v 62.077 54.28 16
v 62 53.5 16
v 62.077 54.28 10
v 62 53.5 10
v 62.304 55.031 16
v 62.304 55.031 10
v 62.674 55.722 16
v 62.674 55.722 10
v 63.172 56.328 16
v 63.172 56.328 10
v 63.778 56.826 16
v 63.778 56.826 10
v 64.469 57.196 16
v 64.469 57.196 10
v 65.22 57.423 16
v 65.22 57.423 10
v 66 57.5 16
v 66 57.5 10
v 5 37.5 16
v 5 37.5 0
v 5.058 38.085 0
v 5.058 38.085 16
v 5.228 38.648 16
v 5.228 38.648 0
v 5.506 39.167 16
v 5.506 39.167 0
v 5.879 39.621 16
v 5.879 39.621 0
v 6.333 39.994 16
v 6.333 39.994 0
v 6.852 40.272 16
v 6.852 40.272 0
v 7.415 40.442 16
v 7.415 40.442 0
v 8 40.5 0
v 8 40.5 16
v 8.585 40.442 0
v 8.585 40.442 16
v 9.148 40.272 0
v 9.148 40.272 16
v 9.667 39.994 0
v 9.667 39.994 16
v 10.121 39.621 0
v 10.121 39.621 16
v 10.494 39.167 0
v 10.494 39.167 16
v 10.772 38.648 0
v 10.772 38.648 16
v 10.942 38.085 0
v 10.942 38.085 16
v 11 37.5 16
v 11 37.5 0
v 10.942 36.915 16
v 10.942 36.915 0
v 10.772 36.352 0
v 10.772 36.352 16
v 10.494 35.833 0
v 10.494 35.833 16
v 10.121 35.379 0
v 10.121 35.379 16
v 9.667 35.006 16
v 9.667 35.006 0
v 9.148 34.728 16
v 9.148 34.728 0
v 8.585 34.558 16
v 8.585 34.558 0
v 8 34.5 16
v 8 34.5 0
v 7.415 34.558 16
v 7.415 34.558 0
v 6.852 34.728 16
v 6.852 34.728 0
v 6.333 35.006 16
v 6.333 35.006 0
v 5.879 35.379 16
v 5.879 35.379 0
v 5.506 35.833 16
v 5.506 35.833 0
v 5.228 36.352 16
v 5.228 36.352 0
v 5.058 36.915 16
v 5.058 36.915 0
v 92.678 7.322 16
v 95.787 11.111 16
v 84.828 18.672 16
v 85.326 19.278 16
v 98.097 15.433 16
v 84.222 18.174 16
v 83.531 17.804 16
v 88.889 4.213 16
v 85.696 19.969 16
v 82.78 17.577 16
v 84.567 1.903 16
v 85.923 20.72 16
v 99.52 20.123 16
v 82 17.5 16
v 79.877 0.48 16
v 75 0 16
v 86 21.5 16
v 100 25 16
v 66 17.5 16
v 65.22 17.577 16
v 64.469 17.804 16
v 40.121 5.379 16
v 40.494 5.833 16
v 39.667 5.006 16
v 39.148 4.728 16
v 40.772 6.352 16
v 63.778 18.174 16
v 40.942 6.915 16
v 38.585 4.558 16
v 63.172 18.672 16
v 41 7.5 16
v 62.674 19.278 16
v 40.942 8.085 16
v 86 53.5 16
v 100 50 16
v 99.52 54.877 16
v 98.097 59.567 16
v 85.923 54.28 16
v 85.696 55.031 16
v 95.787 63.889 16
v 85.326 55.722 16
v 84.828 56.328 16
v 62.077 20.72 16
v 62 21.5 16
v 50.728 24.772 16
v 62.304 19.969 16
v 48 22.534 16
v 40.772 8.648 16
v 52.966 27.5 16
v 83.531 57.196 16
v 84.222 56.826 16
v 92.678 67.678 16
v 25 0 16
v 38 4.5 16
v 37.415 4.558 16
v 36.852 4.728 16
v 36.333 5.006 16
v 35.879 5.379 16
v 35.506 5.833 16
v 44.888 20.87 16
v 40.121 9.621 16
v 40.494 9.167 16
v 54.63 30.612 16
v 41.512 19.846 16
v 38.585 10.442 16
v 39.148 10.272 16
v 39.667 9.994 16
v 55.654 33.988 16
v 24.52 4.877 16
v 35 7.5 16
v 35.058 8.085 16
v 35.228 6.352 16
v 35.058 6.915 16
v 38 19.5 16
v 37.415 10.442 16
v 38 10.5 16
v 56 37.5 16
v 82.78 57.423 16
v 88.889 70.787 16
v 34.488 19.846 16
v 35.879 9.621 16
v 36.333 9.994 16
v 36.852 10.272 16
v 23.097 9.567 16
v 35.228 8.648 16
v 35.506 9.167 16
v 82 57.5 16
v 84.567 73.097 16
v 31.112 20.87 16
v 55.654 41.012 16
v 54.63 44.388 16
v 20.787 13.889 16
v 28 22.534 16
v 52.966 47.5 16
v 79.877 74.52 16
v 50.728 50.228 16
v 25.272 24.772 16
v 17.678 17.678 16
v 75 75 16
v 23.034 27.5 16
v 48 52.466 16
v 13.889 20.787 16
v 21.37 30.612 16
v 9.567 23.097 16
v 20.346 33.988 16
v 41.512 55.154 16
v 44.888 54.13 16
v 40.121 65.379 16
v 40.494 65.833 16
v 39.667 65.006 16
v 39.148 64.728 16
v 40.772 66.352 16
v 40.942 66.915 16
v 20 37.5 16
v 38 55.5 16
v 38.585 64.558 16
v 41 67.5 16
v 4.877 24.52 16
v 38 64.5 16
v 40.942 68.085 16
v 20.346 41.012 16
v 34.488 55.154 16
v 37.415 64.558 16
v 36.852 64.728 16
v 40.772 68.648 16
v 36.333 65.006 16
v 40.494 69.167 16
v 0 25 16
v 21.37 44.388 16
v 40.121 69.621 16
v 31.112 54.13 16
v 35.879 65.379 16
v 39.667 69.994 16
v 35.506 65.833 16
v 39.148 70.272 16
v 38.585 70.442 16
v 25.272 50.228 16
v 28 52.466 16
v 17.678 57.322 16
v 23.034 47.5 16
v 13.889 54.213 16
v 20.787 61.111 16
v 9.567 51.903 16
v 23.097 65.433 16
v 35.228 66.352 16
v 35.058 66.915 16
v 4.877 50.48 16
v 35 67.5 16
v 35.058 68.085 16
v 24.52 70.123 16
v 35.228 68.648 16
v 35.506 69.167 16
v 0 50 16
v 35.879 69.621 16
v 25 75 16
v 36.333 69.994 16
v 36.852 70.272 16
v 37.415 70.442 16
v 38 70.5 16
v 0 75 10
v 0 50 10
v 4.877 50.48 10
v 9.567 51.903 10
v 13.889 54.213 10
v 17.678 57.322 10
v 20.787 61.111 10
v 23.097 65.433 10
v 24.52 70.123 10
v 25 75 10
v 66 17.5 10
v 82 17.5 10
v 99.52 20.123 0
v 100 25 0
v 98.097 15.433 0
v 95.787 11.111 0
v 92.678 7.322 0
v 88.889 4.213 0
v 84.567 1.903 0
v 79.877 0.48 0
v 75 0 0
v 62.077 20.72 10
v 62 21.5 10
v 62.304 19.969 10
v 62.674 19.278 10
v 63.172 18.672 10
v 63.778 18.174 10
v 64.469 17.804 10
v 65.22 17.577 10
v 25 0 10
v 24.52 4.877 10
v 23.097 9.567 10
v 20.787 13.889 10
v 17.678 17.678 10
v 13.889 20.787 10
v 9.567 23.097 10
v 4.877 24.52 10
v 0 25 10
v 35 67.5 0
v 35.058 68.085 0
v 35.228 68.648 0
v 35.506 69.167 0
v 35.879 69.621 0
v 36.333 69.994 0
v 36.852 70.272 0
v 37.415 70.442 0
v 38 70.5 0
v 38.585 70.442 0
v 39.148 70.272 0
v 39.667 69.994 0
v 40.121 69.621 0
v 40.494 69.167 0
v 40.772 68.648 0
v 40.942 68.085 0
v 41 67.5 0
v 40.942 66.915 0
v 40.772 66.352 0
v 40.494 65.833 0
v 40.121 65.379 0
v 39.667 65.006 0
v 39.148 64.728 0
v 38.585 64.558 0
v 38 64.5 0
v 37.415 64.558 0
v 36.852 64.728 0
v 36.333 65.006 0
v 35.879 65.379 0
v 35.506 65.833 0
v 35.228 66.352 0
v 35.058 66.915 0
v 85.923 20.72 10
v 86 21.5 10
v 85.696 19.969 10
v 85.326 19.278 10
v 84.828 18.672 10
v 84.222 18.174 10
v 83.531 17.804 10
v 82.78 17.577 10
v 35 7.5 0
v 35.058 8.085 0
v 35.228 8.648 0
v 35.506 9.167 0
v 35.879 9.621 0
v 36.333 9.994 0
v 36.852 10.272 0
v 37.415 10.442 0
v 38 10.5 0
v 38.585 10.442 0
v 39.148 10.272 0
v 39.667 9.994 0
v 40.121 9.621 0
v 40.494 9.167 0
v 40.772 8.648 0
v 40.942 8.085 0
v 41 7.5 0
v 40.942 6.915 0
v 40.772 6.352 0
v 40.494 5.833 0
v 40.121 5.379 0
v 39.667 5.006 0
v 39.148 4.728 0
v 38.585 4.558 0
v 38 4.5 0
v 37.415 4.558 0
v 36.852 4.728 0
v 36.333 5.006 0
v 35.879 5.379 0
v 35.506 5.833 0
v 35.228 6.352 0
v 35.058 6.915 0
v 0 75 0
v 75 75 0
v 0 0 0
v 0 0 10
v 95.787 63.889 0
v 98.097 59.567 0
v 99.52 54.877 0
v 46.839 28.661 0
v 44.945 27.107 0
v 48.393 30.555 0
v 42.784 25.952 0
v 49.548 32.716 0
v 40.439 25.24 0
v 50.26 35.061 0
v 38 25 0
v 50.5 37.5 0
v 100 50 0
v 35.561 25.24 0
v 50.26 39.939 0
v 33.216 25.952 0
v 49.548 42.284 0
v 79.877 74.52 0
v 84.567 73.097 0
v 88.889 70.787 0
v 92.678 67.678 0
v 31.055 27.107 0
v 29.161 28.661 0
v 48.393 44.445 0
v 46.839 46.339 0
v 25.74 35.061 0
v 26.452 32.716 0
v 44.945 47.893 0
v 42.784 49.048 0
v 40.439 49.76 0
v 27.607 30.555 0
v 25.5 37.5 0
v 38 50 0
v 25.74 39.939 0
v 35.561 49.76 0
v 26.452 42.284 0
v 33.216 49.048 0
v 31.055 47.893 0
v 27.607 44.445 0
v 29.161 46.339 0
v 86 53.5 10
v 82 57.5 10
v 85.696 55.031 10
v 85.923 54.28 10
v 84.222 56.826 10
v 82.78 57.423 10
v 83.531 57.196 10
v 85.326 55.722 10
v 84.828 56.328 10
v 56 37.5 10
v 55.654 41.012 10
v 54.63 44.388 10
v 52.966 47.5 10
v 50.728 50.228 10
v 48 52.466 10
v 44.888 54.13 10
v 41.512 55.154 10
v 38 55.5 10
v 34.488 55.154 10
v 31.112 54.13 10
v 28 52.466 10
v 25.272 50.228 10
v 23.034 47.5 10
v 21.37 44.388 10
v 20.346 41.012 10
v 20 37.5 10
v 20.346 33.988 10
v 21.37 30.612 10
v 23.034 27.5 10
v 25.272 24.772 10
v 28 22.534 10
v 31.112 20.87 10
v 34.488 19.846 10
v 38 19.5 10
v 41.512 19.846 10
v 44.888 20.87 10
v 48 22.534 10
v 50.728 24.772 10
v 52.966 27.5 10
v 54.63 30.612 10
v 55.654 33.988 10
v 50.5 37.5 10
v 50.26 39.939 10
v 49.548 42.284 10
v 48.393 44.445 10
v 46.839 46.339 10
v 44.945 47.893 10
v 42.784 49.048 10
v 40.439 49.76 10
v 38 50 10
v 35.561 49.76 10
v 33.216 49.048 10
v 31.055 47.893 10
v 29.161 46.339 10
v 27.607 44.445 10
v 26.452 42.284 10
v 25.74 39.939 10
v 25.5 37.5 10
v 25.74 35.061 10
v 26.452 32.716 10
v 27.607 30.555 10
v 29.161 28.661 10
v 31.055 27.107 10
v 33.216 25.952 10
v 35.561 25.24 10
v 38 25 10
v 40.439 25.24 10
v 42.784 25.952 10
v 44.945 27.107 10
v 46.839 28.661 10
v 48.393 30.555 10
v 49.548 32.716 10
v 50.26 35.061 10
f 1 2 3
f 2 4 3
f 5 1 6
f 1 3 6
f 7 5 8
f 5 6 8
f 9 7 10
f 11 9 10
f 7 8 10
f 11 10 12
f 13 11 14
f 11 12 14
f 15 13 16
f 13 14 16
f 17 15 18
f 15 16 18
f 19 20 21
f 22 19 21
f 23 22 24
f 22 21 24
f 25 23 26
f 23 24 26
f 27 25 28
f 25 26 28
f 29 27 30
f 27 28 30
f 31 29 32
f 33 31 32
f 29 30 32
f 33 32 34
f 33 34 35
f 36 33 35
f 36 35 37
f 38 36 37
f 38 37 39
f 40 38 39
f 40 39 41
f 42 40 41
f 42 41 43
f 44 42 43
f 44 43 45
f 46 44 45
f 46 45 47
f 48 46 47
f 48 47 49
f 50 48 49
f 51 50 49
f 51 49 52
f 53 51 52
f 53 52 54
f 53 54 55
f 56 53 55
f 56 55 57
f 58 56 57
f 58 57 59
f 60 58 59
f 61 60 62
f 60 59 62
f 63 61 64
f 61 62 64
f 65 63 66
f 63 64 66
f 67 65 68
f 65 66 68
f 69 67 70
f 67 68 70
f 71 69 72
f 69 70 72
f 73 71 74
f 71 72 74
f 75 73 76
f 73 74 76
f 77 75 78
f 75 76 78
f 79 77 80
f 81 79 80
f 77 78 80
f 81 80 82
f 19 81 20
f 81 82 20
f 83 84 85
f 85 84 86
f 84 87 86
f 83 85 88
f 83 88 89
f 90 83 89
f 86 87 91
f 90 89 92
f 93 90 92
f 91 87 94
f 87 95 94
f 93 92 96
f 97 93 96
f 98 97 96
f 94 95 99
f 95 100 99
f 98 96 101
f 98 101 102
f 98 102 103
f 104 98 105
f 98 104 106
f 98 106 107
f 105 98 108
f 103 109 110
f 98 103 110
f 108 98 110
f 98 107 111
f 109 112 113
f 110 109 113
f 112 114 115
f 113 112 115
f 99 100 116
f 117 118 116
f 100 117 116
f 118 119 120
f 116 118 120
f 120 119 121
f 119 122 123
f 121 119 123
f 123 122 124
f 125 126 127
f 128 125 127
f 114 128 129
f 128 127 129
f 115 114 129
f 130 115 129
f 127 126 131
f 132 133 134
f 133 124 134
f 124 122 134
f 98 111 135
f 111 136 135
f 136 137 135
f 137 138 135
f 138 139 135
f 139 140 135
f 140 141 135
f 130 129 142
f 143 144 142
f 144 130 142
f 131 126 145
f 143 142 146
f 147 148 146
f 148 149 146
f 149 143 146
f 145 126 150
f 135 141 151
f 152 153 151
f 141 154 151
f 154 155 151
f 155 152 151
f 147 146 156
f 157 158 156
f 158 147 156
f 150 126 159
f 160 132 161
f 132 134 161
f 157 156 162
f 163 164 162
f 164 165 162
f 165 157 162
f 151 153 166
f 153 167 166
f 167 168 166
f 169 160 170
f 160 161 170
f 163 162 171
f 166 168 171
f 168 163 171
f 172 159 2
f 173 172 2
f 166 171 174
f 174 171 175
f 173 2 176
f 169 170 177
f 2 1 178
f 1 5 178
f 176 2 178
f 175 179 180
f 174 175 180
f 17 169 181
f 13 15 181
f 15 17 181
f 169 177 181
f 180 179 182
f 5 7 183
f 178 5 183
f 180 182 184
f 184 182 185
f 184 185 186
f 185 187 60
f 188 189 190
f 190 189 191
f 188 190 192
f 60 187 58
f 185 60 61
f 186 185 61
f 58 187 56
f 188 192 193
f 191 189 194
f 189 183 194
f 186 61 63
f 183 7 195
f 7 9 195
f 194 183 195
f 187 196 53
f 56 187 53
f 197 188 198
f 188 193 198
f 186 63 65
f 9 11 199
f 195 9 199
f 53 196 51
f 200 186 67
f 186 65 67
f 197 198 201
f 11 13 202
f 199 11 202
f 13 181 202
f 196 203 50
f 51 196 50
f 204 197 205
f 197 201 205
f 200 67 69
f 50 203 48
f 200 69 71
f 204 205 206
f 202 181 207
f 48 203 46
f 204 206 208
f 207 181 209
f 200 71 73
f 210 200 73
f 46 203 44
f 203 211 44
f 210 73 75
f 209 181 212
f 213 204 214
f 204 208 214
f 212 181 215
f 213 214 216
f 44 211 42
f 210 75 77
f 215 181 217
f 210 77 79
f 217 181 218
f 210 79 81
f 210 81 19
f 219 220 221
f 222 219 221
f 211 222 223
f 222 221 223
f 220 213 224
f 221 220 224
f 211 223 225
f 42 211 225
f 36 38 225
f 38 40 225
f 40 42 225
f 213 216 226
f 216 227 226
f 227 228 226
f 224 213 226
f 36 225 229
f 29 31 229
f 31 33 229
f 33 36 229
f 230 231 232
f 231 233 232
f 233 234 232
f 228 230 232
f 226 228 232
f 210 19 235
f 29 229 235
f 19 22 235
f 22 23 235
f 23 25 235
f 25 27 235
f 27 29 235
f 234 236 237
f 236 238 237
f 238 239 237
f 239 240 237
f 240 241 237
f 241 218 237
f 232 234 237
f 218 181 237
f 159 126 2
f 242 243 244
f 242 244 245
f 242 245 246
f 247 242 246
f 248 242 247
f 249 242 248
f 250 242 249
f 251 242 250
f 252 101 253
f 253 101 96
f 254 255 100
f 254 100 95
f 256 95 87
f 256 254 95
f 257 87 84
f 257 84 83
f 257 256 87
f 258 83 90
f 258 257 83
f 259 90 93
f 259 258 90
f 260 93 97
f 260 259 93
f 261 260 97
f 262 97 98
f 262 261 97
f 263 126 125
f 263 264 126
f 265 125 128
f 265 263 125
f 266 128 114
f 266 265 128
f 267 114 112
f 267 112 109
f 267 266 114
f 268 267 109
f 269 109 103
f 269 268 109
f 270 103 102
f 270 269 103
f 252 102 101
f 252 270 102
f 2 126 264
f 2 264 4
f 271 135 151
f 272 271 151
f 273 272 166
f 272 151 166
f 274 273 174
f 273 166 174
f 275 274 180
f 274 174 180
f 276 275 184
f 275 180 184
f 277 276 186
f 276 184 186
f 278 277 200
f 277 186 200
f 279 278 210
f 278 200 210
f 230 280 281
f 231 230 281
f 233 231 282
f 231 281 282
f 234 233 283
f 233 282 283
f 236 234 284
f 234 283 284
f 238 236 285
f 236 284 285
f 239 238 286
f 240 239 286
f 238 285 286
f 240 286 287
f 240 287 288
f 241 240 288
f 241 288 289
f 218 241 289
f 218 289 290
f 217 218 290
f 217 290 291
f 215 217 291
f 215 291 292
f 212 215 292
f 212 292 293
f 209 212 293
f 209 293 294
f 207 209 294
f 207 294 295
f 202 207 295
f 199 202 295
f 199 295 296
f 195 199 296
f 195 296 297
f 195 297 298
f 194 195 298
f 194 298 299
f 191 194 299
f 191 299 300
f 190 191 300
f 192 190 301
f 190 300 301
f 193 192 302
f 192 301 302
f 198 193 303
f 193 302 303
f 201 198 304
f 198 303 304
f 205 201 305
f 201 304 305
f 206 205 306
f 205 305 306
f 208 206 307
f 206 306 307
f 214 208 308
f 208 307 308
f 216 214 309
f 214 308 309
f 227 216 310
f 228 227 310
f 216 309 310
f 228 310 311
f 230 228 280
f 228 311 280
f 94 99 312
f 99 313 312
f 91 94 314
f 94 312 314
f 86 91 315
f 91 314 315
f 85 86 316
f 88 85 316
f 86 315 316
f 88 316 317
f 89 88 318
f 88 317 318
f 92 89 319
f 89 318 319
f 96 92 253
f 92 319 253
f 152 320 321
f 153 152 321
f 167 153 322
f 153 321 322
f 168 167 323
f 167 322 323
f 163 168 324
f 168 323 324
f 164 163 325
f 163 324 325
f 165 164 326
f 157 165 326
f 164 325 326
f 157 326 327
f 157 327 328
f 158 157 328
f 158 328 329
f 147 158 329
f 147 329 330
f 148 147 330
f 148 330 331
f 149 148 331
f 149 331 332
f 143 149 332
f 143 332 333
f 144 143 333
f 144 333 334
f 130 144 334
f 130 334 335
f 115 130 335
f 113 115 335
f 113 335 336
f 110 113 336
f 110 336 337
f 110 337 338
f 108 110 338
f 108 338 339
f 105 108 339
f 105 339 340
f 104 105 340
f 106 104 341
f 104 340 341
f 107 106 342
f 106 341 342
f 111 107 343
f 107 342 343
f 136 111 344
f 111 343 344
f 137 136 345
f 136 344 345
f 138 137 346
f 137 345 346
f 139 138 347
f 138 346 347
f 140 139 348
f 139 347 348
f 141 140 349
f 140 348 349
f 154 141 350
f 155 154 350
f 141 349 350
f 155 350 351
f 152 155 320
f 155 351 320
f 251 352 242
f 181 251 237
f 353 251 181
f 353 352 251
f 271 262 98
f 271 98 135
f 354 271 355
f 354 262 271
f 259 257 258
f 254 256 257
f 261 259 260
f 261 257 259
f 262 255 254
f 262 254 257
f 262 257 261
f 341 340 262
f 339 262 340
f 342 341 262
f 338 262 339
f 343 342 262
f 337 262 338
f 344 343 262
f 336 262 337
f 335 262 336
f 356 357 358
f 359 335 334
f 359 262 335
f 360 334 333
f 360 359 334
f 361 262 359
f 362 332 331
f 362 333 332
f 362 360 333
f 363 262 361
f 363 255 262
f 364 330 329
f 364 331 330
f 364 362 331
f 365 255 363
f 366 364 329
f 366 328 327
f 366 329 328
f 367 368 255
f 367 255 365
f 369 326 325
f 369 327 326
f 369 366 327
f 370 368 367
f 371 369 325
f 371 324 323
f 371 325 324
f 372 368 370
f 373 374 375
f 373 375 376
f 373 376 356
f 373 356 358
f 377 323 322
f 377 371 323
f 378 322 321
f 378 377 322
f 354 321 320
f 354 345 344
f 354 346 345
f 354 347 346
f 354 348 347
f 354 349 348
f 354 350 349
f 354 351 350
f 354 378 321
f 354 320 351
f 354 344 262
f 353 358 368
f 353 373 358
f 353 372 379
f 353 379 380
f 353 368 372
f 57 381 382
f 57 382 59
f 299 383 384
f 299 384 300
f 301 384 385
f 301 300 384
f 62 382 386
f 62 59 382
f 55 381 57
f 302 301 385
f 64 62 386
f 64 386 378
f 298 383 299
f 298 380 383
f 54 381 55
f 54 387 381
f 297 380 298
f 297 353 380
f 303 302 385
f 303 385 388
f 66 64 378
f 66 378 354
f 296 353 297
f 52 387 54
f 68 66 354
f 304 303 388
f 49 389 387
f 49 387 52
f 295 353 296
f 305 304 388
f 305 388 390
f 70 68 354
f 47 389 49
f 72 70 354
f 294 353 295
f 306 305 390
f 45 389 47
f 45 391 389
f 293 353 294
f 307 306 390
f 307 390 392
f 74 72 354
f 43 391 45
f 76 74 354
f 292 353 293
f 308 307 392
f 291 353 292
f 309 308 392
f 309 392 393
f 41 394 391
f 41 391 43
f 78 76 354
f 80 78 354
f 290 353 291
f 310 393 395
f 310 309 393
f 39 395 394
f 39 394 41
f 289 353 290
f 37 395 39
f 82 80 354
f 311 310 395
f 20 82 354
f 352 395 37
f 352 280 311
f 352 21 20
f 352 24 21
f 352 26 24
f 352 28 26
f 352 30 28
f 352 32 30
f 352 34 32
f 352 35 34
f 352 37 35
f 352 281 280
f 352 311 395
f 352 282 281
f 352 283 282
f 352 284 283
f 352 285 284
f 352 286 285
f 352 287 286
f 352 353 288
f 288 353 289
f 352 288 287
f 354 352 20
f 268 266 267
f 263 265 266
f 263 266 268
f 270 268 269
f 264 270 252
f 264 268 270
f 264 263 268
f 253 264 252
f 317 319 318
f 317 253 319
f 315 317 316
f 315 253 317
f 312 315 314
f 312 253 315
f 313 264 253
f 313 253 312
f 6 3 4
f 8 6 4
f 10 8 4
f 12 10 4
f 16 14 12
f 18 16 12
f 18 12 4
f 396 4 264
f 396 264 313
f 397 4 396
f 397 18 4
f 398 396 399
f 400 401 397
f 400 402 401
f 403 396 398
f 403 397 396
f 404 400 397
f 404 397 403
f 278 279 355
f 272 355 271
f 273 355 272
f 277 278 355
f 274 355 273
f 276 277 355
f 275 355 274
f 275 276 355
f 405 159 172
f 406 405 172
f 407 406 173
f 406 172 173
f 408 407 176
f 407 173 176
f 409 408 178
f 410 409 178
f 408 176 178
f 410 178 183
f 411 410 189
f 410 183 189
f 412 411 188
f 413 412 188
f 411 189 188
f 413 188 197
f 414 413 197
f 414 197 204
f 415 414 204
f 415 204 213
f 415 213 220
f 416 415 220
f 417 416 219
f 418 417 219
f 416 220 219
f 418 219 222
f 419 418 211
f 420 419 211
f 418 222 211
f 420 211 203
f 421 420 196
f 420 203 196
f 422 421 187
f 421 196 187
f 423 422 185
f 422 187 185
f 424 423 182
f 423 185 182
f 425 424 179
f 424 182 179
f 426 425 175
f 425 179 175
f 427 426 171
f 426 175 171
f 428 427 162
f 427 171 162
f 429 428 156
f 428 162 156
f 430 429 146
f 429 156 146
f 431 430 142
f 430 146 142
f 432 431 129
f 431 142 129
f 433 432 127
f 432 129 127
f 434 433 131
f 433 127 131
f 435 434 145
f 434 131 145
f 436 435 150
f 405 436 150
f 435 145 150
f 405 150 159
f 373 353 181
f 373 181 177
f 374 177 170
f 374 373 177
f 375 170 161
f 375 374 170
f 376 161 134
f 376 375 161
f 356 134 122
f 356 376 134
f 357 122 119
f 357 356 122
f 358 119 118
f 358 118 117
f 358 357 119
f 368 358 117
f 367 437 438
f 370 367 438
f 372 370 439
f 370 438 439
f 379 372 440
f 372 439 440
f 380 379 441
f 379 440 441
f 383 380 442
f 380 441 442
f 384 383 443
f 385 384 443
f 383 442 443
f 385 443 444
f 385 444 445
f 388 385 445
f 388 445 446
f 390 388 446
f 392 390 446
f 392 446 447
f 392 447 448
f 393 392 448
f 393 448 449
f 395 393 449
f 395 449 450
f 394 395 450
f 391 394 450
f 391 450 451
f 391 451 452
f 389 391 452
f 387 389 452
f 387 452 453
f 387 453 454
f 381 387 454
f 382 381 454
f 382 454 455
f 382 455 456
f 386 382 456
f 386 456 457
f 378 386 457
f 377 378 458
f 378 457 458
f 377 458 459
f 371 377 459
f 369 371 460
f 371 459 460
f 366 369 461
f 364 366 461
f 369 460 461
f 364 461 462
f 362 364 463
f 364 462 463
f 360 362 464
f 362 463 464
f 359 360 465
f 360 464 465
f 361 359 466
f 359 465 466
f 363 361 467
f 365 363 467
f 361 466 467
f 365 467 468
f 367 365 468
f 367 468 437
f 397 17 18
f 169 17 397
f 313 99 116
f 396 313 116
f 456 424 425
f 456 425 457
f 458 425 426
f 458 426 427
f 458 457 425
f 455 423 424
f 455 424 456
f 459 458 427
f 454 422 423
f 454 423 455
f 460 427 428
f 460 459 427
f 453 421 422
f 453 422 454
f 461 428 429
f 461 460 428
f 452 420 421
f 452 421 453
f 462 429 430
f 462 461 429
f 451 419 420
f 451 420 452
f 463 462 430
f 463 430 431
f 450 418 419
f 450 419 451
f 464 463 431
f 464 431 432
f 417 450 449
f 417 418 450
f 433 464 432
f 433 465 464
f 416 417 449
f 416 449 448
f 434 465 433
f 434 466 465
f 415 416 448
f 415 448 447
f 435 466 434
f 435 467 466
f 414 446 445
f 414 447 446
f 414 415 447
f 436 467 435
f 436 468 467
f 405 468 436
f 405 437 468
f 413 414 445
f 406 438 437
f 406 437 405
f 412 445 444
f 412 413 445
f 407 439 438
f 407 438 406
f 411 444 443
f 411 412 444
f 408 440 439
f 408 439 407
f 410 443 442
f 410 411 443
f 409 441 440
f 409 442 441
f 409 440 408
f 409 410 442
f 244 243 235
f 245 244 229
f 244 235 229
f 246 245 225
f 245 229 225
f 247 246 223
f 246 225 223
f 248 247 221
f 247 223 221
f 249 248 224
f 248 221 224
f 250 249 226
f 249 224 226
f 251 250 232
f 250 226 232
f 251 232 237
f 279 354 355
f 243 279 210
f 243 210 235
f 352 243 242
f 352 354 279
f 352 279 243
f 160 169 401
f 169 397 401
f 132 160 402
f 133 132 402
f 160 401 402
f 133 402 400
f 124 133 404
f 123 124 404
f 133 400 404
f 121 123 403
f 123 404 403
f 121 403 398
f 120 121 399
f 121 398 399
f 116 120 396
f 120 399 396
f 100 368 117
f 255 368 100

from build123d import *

# Parameters (mm, degrees)
EXTRUDE1_DEPTH     = 16
SKETCH2_R          = 12.5
CUT_EXTRUDE1_DEPTH = 17
SKETCH3_R          = 18
CUT_EXTRUDE2_DEPTH = 6
SKETCH4_W          = 24
SKETCH4_H          = 40
CUT_EXTRUDE3_DEPTH = 6
FILLET1_R          = 4
HOLE1_D            = 6
SKETCH7_R          = 25
CUT_EXTRUDE4_DEPTH = 6


with BuildPart() as part:
    # Sketch1 → Extrude1 (new body)
    with BuildSketch(Plane.XY):
        with BuildLine():
            Line((0, 75), (75, 75))
            ThreePointArc((75, 75), (92.67766953, 67.67766953), (100, 50))
            Line((100, 50), (100, 25))
            ThreePointArc((100, 25), (92.67766953, 7.32233047), (75, 0))
            Line((75, 0), (0, 0))
            Line((0, 0), (0, 75))
        make_face()
    extrude(amount=EXTRUDE1_DEPTH)

    # Sketch2 → Cut-Extrude1 (cut, through all)
    with BuildSketch(Plane.XY.offset(16)):
        with Locations((38, 37.5)):
            Circle(SKETCH2_R)
    extrude(amount=-CUT_EXTRUDE1_DEPTH, mode=Mode.SUBTRACT)

    # Sketch3 → Cut-Extrude2 (cut)
    with BuildSketch(Plane.XY.offset(16)):
        with Locations((38, 37.5)):
            Circle(SKETCH3_R)
    extrude(amount=-CUT_EXTRUDE2_DEPTH, mode=Mode.SUBTRACT)

    # Sketch4 → Cut-Extrude3 (cut)
    with BuildSketch(Plane.XY.offset(16)):
        with Locations((74, 37.5)):
            Rectangle(SKETCH4_W, SKETCH4_H)
    extrude(amount=-CUT_EXTRUDE3_DEPTH, mode=Mode.SUBTRACT)

    # Fillet1
    fillet1_edges = [part.edges().sort_by_distance(p)[0] for p in [
        (62, 17.5, 13),
        (62, 57.5, 13),
        (86, 57.5, 13),
        (86, 17.5, 13),
    ]]
    fillet(fillet1_edges, radius=FILLET1_R)

    # Hole1 (through all)
    with Locations(Plane.XY.offset(16)):
        with Locations((38, 67.5), (8, 37.5), (38, 7.5)):
            Hole(HOLE1_D / 2)

    # Sketch7 → Cut-Extrude4 (cut)
    with BuildSketch(Plane.XY.offset(16)):
        with Locations((0, 75)):
            Circle(SKETCH7_R)
        Circle(SKETCH7_R)
    extrude(amount=-CUT_EXTRUDE4_DEPTH, mode=Mode.SUBTRACT)


solid = part.part
